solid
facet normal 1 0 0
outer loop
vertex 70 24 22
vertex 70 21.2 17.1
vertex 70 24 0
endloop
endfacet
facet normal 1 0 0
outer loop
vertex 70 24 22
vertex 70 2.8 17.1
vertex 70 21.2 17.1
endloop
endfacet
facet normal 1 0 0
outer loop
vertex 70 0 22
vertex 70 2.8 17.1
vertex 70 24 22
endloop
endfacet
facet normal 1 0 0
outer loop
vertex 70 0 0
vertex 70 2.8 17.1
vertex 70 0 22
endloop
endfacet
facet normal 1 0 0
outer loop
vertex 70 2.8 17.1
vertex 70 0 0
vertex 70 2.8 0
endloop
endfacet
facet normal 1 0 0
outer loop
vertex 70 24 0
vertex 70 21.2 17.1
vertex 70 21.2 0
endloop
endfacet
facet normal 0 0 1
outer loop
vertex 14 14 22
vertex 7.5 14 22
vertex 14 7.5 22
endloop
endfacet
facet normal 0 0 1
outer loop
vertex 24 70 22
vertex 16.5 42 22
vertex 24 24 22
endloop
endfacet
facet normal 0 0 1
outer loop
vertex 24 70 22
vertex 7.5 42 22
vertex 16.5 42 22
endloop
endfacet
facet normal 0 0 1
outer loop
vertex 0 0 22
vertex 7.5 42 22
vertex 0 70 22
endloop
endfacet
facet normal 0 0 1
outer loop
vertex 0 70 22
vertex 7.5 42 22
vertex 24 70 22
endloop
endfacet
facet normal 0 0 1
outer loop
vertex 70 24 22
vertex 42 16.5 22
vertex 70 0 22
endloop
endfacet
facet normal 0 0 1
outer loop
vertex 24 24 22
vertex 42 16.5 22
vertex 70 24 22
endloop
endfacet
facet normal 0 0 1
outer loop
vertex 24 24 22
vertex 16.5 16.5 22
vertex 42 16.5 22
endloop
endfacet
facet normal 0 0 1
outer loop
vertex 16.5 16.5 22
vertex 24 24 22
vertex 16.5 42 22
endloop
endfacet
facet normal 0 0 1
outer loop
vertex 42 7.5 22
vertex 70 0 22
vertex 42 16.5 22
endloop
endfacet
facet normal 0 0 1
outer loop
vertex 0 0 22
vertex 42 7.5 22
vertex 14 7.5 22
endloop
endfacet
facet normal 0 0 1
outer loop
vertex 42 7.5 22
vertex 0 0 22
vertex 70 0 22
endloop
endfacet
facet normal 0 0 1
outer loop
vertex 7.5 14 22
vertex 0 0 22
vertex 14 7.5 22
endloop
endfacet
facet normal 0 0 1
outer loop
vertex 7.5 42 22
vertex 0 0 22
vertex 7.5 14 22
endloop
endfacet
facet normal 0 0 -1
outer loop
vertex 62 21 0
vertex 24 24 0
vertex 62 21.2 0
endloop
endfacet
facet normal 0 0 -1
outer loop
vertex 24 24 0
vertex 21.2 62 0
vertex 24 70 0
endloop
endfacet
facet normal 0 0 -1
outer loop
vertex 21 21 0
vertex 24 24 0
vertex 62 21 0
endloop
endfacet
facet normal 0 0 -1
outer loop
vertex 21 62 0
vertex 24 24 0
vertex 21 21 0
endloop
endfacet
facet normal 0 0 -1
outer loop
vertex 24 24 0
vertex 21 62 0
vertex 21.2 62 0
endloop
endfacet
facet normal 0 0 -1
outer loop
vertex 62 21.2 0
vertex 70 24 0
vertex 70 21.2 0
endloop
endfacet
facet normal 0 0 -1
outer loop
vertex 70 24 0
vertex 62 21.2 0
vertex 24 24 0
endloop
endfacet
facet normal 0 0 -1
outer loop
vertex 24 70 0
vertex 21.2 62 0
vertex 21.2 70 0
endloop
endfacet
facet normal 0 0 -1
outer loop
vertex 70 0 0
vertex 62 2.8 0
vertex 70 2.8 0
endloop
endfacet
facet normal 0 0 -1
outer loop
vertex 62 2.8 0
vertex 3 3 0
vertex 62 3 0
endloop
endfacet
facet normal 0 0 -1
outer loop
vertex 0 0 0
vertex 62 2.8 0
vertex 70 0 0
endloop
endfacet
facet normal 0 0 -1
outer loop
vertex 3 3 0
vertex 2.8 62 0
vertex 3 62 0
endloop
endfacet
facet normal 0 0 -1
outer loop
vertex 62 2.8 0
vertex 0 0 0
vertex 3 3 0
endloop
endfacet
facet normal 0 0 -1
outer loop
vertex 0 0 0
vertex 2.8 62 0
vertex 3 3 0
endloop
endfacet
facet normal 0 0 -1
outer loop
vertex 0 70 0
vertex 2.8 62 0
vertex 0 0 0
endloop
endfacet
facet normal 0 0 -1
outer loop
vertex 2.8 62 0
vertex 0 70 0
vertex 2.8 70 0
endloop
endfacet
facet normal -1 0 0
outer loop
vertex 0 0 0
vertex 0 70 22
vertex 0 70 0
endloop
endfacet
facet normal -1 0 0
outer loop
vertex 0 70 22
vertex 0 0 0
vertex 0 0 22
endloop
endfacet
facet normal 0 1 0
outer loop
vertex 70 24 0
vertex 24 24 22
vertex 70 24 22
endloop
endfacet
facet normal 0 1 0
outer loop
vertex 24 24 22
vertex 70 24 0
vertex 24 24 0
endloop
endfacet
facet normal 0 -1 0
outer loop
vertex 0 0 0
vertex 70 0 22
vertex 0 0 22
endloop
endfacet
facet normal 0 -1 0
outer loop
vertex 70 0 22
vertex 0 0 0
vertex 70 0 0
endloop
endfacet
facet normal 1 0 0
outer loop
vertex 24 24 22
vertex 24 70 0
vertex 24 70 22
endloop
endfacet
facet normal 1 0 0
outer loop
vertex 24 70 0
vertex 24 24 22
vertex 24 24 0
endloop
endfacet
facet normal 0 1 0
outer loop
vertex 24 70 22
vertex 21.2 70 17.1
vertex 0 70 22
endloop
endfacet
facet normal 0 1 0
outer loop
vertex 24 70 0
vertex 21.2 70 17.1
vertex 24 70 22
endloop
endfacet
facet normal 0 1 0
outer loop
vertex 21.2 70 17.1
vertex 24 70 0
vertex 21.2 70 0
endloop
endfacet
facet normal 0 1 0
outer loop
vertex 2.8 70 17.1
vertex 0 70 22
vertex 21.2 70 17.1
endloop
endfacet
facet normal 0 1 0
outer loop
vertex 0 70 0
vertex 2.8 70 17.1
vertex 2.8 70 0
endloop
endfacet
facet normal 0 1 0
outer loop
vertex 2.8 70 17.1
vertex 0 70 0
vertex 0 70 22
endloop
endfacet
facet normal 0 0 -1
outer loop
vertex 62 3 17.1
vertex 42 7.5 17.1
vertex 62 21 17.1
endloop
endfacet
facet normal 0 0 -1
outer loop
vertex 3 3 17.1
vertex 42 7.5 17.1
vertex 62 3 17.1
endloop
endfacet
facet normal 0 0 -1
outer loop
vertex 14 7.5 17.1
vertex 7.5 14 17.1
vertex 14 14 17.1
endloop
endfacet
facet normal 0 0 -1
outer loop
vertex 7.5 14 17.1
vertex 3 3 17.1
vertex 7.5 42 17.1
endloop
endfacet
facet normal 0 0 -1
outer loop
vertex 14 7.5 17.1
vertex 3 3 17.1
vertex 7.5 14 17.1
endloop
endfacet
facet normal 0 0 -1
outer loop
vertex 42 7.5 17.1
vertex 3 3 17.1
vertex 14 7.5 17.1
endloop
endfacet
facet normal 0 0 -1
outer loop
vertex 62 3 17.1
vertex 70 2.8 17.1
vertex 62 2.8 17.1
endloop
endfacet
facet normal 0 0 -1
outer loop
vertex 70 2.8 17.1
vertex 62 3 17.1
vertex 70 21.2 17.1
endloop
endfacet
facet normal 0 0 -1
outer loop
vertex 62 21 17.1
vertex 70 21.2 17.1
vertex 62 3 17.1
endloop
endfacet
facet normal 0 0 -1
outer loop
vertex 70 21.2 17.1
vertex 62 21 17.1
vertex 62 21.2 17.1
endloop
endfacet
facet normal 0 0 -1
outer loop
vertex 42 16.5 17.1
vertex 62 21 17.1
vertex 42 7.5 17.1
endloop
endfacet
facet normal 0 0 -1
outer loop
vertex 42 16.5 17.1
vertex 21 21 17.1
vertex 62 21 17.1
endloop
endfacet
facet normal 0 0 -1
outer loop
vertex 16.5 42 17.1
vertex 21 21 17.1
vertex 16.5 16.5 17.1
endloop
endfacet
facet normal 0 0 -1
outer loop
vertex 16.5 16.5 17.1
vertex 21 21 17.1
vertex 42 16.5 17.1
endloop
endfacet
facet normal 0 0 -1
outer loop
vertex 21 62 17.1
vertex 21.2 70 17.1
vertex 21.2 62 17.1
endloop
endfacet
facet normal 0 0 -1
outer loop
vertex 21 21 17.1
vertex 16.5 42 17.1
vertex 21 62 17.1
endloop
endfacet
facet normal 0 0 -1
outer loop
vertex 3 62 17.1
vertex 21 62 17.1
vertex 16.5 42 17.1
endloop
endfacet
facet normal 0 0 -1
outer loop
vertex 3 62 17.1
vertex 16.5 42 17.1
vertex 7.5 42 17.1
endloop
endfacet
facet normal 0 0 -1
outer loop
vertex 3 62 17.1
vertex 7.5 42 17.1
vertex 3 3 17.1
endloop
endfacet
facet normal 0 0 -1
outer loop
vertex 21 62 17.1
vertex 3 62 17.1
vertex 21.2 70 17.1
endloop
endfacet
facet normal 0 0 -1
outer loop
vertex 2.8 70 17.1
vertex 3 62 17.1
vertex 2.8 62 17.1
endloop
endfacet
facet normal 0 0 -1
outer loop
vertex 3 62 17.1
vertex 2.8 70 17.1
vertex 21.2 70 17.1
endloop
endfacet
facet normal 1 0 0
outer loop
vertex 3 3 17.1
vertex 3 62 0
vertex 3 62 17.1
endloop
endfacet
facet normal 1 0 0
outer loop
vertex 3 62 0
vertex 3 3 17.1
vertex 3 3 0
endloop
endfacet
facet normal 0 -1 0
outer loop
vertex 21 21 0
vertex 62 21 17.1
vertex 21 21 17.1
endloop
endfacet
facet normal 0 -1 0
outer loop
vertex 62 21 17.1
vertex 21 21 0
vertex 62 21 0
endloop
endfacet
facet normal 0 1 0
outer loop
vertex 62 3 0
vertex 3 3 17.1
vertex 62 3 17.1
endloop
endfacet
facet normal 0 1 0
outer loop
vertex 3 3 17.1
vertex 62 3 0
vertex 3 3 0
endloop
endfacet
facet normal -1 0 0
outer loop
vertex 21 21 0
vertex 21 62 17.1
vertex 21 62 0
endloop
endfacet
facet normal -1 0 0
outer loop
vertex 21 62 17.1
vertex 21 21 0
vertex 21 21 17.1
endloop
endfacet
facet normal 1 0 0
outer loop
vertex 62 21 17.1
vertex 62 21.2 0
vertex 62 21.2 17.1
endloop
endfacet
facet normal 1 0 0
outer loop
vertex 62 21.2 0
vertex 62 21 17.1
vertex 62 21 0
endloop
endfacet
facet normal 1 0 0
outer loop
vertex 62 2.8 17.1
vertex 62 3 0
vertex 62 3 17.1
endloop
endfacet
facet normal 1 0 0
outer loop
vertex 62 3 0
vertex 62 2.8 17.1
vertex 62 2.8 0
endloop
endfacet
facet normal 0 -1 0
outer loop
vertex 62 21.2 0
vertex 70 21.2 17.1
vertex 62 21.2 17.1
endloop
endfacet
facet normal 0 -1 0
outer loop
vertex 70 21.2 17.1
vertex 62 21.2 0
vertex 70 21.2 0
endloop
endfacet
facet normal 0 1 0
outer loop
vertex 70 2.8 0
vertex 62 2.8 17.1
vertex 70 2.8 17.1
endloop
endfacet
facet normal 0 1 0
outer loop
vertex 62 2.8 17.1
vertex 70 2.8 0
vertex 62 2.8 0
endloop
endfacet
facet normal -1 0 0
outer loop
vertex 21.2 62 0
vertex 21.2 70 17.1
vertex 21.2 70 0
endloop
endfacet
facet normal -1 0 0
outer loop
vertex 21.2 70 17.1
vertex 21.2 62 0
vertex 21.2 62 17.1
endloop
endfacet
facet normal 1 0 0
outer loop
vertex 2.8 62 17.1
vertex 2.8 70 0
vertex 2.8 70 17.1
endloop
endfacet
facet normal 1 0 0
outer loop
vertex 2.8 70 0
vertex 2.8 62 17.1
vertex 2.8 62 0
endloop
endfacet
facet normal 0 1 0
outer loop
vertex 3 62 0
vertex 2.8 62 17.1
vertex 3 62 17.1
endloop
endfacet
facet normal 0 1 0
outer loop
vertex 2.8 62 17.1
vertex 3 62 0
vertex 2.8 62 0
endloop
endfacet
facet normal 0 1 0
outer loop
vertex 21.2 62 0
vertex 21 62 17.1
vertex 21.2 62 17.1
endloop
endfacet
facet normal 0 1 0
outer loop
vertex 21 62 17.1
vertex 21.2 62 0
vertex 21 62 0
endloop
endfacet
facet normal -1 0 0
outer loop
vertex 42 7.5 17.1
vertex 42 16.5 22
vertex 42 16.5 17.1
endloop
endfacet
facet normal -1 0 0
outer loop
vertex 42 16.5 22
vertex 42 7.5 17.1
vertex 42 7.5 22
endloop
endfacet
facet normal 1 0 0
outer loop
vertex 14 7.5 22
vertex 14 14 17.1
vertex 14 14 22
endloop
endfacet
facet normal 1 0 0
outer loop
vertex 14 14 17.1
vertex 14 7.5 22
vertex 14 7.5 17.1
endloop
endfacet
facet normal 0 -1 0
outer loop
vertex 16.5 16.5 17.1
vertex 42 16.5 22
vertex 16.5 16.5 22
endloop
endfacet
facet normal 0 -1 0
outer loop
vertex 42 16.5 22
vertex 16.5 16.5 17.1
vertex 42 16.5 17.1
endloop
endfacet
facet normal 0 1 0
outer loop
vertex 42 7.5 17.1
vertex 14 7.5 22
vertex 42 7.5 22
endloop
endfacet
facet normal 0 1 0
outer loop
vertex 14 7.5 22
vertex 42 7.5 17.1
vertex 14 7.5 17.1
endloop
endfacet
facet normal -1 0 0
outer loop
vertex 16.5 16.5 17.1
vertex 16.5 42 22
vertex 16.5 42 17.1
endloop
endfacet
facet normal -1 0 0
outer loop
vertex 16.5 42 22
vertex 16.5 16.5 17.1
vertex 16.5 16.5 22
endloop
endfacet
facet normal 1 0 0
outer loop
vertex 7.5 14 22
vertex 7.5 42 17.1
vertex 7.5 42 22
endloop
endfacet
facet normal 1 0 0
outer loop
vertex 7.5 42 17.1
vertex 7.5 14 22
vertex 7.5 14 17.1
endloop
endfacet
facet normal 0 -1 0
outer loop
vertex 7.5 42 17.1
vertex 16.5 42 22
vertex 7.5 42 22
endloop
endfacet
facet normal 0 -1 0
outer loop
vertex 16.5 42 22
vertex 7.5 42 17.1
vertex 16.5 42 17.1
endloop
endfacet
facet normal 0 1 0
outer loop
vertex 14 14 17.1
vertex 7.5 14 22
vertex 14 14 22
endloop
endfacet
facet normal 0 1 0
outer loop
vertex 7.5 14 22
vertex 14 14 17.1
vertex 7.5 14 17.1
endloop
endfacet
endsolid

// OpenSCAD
// İkinci ürün = kulaksız gövde (corner-plain ile aynı).
// 70×22, et 3 mm, U kanal 18 mm.

clamp = 18;
entry = 18.4;
wall = 3;
arm = 70;
h = 22;
top = 5;
drop = h - top;
mouth = 8;
ch = wall + clamp + wall;

difference() {
  union() {
    cube([arm, ch, h]);
    cube([ch, arm, h]);
  }
  translate([wall, wall, -0.1]) cube([arm - wall + 1, clamp, drop + 0.2]);
  translate([wall, wall, -0.1]) cube([clamp, arm - wall + 1, drop + 0.2]);
  flare = (entry - clamp) / 2;
  translate([arm - mouth, wall - flare, -0.1]) cube([mouth + 1, entry, drop + 0.2]);
  translate([wall - flare, arm - mouth, -0.1]) cube([entry, mouth + 1, drop + 0.2]);
  win = 9;
  translate([14, wall + (clamp - win) / 2, drop - 1]) cube([28, win, top + 2]);
  translate([wall + (clamp - win) / 2, 14, drop - 1]) cube([win, 28, top + 2]);
}
